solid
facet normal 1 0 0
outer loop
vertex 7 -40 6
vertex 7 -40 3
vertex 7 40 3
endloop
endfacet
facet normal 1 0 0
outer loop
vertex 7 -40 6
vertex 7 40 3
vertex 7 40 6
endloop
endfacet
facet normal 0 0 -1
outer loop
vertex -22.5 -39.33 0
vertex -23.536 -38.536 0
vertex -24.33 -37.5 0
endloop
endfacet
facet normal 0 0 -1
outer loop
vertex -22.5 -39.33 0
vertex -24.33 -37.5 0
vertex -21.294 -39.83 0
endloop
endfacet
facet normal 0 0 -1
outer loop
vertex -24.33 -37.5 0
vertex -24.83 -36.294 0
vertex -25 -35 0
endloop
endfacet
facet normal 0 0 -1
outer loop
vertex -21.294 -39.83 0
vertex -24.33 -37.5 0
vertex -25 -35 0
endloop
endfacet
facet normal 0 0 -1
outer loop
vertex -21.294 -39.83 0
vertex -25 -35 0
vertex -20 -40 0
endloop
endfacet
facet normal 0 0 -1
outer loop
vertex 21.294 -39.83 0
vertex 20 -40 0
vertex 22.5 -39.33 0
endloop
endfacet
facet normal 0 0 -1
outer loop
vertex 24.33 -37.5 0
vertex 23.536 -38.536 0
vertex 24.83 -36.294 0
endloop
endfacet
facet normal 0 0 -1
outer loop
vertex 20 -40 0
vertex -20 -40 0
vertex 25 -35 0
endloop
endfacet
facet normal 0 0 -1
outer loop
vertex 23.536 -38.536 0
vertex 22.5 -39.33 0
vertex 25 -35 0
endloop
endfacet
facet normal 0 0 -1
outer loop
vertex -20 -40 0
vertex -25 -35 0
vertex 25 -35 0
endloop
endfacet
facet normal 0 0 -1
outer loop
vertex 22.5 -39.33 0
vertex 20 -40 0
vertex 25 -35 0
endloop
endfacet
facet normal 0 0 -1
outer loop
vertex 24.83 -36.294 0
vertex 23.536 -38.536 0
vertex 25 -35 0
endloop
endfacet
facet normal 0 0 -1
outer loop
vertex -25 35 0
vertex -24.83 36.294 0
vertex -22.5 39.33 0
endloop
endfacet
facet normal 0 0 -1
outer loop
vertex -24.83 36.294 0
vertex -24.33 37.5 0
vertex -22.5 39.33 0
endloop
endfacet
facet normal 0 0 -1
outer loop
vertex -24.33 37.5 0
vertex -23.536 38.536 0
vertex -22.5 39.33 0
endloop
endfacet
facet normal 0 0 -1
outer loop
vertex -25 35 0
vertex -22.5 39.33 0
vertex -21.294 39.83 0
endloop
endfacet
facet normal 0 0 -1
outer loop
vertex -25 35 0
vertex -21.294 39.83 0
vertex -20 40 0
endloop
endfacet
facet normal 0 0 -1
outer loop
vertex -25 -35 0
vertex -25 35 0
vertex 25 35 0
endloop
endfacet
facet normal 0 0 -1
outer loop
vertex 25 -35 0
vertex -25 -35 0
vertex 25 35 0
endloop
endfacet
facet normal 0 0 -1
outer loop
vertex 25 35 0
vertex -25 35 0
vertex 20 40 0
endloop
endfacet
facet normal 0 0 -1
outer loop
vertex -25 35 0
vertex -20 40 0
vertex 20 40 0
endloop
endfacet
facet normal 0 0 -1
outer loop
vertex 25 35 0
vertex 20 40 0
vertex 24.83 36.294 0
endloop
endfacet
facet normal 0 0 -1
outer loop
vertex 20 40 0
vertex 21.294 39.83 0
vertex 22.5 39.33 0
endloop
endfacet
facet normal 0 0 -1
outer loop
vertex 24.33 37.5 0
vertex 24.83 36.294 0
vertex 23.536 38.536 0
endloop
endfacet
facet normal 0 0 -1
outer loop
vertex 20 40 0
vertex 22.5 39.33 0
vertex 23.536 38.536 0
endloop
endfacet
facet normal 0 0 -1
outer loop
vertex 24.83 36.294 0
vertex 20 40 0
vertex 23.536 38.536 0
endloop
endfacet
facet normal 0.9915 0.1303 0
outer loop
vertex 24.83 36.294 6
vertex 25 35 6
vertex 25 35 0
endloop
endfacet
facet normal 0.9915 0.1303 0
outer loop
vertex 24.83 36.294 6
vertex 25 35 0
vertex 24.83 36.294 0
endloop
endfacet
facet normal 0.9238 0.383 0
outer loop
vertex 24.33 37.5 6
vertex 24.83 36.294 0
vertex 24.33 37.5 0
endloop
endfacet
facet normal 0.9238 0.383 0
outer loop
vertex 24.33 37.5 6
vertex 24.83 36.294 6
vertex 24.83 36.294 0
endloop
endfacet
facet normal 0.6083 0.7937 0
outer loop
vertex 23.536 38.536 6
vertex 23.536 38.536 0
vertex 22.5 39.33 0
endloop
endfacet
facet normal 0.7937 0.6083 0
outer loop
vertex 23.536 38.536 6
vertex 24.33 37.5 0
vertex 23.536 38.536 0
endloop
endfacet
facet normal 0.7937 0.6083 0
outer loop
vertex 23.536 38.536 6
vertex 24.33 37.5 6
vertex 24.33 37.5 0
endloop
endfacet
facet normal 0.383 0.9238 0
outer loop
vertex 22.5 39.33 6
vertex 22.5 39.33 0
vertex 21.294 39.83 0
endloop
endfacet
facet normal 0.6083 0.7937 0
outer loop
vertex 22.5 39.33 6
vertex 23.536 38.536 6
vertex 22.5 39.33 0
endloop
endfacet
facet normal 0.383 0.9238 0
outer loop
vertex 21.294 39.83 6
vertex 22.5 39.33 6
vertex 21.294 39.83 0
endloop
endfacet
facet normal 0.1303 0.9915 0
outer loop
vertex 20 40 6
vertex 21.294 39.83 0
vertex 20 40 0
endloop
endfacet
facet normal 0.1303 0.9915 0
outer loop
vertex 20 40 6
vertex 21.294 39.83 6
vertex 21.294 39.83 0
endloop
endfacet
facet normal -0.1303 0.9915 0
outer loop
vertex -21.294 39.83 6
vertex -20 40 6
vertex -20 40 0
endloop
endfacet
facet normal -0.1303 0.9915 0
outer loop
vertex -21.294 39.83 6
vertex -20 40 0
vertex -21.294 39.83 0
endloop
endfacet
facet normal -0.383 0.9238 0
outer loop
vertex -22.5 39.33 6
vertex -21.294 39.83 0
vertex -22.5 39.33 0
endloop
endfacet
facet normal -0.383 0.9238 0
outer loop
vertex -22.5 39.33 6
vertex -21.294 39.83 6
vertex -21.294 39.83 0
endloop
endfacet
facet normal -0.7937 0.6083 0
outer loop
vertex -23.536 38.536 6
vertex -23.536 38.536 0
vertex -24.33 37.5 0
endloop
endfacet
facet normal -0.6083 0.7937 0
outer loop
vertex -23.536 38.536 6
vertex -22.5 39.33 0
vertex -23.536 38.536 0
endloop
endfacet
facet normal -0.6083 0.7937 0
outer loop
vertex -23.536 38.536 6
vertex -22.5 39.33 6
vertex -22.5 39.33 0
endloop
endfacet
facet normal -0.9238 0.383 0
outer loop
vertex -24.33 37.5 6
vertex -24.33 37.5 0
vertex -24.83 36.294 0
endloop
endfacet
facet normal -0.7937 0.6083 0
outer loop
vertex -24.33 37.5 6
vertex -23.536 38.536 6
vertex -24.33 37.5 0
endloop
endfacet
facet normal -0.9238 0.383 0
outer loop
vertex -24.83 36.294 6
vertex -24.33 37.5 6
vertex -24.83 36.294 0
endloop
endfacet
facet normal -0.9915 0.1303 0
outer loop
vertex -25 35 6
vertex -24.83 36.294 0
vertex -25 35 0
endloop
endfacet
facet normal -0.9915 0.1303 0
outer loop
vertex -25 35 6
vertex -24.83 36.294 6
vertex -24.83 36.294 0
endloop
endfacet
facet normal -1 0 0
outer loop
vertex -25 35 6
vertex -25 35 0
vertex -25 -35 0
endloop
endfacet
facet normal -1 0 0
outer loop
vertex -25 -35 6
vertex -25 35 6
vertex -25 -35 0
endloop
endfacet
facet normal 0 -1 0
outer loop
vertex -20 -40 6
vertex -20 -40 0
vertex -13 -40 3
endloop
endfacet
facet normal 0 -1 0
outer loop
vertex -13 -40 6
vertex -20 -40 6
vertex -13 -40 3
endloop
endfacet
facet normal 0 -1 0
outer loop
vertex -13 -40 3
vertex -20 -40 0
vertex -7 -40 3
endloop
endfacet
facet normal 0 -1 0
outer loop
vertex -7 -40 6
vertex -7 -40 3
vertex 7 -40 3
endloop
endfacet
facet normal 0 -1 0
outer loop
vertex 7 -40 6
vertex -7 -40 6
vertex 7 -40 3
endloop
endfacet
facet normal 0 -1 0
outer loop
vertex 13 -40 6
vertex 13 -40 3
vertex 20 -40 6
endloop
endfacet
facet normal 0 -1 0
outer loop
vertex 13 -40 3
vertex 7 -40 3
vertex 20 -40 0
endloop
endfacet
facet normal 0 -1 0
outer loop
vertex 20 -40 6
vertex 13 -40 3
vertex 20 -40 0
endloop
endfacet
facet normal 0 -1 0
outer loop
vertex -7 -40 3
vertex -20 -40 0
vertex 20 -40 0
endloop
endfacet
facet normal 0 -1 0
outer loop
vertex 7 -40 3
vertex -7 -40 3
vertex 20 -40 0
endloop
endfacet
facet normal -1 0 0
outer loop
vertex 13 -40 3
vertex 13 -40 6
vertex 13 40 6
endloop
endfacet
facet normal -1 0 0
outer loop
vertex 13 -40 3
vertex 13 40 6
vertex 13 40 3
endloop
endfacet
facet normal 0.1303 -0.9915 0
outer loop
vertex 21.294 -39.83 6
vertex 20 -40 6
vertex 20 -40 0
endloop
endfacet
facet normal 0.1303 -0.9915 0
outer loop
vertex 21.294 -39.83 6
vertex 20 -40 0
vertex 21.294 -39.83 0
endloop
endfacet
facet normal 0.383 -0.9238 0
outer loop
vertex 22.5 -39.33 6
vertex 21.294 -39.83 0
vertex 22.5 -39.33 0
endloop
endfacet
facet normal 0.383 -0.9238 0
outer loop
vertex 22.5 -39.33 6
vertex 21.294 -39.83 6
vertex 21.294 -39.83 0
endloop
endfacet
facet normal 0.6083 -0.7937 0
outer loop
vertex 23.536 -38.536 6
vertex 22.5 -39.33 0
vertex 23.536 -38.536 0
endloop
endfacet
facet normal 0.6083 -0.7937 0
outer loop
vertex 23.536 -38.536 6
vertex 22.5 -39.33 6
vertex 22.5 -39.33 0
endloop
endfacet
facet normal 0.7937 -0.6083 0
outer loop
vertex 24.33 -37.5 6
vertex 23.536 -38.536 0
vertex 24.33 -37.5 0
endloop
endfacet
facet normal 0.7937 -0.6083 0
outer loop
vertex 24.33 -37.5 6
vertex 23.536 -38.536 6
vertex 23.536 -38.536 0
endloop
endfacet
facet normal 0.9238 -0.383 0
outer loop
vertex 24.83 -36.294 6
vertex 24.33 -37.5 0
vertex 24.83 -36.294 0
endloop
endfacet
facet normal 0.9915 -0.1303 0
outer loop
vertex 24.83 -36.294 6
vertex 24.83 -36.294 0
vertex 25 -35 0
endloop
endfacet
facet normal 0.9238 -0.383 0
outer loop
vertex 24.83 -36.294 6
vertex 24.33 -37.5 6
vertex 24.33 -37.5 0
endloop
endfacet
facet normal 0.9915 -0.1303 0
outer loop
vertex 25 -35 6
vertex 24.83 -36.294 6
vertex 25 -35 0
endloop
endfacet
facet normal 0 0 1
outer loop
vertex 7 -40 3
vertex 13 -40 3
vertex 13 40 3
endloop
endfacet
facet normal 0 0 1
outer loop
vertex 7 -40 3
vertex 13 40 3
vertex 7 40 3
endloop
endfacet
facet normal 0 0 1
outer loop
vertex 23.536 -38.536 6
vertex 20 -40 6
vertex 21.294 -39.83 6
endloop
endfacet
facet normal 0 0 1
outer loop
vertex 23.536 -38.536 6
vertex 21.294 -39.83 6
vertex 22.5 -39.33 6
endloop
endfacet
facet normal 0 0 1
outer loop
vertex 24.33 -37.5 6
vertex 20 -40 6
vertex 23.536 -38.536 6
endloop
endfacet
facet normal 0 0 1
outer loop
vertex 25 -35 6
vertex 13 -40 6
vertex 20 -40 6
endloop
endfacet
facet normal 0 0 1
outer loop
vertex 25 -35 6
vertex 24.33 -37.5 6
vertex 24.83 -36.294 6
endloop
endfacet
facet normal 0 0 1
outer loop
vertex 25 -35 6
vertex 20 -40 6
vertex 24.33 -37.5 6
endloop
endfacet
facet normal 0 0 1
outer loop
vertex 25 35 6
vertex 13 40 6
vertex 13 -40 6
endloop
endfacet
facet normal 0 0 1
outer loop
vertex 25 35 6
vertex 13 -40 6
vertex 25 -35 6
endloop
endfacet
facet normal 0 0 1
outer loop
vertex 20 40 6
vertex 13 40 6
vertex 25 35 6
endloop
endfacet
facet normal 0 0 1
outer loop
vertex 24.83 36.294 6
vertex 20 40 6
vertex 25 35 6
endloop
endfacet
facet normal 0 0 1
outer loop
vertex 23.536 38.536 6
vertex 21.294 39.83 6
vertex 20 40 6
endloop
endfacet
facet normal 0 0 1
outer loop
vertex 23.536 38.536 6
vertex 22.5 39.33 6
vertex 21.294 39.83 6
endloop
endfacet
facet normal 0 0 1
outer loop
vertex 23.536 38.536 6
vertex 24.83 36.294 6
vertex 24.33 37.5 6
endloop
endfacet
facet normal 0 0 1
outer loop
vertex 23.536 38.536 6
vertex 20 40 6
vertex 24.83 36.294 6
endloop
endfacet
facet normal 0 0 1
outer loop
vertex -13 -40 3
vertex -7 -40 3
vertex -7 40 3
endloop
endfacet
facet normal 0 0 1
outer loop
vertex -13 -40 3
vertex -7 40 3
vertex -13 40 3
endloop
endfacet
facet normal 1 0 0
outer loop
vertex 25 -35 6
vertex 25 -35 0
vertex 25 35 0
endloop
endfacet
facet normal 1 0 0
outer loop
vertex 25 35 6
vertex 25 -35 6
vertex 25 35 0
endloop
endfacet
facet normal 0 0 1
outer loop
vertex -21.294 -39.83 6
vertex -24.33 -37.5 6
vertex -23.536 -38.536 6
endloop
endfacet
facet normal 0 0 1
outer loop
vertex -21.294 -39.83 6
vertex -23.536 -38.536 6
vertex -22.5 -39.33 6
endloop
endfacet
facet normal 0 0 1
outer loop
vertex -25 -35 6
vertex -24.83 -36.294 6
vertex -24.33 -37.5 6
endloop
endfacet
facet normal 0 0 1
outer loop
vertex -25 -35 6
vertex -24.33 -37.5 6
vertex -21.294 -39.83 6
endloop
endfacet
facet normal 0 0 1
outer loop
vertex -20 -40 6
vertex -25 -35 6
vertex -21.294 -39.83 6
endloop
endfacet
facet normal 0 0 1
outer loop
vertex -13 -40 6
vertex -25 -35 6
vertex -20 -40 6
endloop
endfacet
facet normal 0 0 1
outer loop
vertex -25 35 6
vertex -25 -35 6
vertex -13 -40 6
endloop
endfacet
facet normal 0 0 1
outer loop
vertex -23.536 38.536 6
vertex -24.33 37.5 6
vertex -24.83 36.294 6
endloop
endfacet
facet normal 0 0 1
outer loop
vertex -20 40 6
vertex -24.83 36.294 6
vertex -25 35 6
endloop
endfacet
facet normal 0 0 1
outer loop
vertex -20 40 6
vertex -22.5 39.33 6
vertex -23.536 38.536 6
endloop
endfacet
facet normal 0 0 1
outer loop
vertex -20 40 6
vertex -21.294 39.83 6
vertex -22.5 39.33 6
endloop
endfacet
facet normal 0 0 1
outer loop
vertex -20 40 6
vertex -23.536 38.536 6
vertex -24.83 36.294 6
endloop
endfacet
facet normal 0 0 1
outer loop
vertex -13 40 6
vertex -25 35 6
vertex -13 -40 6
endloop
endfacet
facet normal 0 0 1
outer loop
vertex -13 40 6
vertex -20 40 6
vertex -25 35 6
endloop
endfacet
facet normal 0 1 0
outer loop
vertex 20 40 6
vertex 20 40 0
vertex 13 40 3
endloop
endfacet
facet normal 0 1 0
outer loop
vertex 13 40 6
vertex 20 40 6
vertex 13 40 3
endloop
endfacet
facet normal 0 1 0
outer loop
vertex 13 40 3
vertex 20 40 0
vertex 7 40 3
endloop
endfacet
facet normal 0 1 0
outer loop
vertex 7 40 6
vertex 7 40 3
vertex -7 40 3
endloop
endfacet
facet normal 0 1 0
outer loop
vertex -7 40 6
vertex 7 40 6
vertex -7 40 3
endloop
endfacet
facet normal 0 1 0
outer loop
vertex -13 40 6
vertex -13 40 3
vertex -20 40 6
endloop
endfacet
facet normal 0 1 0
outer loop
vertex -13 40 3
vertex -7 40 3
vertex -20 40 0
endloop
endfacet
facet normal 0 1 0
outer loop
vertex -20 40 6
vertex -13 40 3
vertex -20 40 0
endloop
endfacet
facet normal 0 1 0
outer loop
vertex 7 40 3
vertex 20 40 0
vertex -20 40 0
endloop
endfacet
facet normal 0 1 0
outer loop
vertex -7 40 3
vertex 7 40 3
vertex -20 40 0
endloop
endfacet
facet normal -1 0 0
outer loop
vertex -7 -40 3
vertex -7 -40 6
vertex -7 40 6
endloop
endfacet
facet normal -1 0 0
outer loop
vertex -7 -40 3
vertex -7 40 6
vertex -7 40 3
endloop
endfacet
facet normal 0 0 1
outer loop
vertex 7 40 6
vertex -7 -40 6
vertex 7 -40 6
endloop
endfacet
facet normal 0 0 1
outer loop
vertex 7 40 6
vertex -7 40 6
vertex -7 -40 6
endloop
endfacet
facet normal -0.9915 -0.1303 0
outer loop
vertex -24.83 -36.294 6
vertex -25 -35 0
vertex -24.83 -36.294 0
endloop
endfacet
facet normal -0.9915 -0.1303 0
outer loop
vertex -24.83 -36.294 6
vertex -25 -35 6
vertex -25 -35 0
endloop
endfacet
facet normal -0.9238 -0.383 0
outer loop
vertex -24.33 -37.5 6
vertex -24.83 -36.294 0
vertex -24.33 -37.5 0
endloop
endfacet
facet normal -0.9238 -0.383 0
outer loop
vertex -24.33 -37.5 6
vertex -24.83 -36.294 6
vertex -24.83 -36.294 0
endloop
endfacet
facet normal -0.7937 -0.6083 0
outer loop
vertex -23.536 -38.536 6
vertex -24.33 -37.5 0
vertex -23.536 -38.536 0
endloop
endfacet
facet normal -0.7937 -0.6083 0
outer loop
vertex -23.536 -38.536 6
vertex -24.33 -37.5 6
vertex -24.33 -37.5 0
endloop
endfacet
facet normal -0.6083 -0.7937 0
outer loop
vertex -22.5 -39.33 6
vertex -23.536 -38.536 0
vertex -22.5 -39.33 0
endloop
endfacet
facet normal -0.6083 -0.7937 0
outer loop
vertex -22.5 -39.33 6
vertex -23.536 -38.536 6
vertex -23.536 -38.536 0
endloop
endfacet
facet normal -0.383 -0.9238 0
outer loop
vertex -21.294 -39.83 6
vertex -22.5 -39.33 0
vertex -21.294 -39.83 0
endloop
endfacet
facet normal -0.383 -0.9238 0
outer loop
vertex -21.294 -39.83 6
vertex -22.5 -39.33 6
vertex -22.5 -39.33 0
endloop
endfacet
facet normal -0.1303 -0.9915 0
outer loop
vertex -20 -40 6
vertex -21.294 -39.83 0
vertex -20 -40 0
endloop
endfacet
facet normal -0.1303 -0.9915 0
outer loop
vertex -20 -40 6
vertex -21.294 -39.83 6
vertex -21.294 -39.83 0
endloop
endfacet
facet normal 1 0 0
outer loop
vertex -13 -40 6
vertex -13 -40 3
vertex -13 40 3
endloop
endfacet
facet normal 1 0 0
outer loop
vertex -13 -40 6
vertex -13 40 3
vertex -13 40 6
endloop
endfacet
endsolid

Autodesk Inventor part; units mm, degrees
ref_plane "YZ Plane" through (0, 0, 0) normal (1, 0, 0) x (0, 1, 0)
ref_plane "XZ Plane" through (0, 0, 0) normal (0, 1, 0) x (-1, 0, 0)
ref_plane "XY Plane" through (0, 0, 0) normal (0, 0, 1) x (1, 0, 0)
sketch "Sketch1" plane through (0, 0, 0) normal (0, 0, 1) x (1, 0, 0)
  line L0 (-25, -40) -> (25, -40)
  line L1 (25, -40) -> (25, 40)
  line L2 (25, 40) -> (-25, 40)
  line L3 (-25, 40) -> (-25, -40)
  line L4 (-25, -40) -> (25, 40) construction
  line L5 (25, -40) -> (-25, 40) construction
  point P0 (0, 0)
  dimension "d0" = 50
  dimension "d1" = 80
extrude "Extrusion1" add sketch "Sketch1" along normal blind 6
sketch "Sketch2" plane through (-25, -40, 0) normal (0, -1, 0) x (1, 0, 0)
  line L0 (0, 6) -> (50, 6) projected
  line L1 (12, 6) -> (18, 6)
  line L2 (18, 6) -> (18, 3)
  line L3 (18, 3) -> (12, 3)
  line L4 (12, 3) -> (12, 6)
  line L5 (32, 6) -> (38, 6)
  line L6 (38, 6) -> (38, 3)
  line L7 (38, 3) -> (32, 3)
  line L8 (32, 3) -> (32, 6)
  line L9 (25, -1.2) -> (25, 7.2) construction
  line L10 (0, 0) -> (50, 0) construction
  line L11 (50, 0) -> (50, 6) construction
  line L12 (0, 6) -> (50, 6) construction
  line L13 (0, 0) -> (0, 6) construction
  point P0 (25, 0)
  point P1 (32, 4.5)
  point P2 (18, 4.5)
  dimension "d4" = 14
  dimension "d5" = 6
  dimension "d7" = 3
extrude "Extrusion2" cut sketch "Sketch2" against normal through all
fillet "Fillet1" radius 5 4 edges at (-25, 40, 3) (-25, -40, 3) (25, -40, 3) (25, 40, 3)
properties part number "Plate" material "Steel"
